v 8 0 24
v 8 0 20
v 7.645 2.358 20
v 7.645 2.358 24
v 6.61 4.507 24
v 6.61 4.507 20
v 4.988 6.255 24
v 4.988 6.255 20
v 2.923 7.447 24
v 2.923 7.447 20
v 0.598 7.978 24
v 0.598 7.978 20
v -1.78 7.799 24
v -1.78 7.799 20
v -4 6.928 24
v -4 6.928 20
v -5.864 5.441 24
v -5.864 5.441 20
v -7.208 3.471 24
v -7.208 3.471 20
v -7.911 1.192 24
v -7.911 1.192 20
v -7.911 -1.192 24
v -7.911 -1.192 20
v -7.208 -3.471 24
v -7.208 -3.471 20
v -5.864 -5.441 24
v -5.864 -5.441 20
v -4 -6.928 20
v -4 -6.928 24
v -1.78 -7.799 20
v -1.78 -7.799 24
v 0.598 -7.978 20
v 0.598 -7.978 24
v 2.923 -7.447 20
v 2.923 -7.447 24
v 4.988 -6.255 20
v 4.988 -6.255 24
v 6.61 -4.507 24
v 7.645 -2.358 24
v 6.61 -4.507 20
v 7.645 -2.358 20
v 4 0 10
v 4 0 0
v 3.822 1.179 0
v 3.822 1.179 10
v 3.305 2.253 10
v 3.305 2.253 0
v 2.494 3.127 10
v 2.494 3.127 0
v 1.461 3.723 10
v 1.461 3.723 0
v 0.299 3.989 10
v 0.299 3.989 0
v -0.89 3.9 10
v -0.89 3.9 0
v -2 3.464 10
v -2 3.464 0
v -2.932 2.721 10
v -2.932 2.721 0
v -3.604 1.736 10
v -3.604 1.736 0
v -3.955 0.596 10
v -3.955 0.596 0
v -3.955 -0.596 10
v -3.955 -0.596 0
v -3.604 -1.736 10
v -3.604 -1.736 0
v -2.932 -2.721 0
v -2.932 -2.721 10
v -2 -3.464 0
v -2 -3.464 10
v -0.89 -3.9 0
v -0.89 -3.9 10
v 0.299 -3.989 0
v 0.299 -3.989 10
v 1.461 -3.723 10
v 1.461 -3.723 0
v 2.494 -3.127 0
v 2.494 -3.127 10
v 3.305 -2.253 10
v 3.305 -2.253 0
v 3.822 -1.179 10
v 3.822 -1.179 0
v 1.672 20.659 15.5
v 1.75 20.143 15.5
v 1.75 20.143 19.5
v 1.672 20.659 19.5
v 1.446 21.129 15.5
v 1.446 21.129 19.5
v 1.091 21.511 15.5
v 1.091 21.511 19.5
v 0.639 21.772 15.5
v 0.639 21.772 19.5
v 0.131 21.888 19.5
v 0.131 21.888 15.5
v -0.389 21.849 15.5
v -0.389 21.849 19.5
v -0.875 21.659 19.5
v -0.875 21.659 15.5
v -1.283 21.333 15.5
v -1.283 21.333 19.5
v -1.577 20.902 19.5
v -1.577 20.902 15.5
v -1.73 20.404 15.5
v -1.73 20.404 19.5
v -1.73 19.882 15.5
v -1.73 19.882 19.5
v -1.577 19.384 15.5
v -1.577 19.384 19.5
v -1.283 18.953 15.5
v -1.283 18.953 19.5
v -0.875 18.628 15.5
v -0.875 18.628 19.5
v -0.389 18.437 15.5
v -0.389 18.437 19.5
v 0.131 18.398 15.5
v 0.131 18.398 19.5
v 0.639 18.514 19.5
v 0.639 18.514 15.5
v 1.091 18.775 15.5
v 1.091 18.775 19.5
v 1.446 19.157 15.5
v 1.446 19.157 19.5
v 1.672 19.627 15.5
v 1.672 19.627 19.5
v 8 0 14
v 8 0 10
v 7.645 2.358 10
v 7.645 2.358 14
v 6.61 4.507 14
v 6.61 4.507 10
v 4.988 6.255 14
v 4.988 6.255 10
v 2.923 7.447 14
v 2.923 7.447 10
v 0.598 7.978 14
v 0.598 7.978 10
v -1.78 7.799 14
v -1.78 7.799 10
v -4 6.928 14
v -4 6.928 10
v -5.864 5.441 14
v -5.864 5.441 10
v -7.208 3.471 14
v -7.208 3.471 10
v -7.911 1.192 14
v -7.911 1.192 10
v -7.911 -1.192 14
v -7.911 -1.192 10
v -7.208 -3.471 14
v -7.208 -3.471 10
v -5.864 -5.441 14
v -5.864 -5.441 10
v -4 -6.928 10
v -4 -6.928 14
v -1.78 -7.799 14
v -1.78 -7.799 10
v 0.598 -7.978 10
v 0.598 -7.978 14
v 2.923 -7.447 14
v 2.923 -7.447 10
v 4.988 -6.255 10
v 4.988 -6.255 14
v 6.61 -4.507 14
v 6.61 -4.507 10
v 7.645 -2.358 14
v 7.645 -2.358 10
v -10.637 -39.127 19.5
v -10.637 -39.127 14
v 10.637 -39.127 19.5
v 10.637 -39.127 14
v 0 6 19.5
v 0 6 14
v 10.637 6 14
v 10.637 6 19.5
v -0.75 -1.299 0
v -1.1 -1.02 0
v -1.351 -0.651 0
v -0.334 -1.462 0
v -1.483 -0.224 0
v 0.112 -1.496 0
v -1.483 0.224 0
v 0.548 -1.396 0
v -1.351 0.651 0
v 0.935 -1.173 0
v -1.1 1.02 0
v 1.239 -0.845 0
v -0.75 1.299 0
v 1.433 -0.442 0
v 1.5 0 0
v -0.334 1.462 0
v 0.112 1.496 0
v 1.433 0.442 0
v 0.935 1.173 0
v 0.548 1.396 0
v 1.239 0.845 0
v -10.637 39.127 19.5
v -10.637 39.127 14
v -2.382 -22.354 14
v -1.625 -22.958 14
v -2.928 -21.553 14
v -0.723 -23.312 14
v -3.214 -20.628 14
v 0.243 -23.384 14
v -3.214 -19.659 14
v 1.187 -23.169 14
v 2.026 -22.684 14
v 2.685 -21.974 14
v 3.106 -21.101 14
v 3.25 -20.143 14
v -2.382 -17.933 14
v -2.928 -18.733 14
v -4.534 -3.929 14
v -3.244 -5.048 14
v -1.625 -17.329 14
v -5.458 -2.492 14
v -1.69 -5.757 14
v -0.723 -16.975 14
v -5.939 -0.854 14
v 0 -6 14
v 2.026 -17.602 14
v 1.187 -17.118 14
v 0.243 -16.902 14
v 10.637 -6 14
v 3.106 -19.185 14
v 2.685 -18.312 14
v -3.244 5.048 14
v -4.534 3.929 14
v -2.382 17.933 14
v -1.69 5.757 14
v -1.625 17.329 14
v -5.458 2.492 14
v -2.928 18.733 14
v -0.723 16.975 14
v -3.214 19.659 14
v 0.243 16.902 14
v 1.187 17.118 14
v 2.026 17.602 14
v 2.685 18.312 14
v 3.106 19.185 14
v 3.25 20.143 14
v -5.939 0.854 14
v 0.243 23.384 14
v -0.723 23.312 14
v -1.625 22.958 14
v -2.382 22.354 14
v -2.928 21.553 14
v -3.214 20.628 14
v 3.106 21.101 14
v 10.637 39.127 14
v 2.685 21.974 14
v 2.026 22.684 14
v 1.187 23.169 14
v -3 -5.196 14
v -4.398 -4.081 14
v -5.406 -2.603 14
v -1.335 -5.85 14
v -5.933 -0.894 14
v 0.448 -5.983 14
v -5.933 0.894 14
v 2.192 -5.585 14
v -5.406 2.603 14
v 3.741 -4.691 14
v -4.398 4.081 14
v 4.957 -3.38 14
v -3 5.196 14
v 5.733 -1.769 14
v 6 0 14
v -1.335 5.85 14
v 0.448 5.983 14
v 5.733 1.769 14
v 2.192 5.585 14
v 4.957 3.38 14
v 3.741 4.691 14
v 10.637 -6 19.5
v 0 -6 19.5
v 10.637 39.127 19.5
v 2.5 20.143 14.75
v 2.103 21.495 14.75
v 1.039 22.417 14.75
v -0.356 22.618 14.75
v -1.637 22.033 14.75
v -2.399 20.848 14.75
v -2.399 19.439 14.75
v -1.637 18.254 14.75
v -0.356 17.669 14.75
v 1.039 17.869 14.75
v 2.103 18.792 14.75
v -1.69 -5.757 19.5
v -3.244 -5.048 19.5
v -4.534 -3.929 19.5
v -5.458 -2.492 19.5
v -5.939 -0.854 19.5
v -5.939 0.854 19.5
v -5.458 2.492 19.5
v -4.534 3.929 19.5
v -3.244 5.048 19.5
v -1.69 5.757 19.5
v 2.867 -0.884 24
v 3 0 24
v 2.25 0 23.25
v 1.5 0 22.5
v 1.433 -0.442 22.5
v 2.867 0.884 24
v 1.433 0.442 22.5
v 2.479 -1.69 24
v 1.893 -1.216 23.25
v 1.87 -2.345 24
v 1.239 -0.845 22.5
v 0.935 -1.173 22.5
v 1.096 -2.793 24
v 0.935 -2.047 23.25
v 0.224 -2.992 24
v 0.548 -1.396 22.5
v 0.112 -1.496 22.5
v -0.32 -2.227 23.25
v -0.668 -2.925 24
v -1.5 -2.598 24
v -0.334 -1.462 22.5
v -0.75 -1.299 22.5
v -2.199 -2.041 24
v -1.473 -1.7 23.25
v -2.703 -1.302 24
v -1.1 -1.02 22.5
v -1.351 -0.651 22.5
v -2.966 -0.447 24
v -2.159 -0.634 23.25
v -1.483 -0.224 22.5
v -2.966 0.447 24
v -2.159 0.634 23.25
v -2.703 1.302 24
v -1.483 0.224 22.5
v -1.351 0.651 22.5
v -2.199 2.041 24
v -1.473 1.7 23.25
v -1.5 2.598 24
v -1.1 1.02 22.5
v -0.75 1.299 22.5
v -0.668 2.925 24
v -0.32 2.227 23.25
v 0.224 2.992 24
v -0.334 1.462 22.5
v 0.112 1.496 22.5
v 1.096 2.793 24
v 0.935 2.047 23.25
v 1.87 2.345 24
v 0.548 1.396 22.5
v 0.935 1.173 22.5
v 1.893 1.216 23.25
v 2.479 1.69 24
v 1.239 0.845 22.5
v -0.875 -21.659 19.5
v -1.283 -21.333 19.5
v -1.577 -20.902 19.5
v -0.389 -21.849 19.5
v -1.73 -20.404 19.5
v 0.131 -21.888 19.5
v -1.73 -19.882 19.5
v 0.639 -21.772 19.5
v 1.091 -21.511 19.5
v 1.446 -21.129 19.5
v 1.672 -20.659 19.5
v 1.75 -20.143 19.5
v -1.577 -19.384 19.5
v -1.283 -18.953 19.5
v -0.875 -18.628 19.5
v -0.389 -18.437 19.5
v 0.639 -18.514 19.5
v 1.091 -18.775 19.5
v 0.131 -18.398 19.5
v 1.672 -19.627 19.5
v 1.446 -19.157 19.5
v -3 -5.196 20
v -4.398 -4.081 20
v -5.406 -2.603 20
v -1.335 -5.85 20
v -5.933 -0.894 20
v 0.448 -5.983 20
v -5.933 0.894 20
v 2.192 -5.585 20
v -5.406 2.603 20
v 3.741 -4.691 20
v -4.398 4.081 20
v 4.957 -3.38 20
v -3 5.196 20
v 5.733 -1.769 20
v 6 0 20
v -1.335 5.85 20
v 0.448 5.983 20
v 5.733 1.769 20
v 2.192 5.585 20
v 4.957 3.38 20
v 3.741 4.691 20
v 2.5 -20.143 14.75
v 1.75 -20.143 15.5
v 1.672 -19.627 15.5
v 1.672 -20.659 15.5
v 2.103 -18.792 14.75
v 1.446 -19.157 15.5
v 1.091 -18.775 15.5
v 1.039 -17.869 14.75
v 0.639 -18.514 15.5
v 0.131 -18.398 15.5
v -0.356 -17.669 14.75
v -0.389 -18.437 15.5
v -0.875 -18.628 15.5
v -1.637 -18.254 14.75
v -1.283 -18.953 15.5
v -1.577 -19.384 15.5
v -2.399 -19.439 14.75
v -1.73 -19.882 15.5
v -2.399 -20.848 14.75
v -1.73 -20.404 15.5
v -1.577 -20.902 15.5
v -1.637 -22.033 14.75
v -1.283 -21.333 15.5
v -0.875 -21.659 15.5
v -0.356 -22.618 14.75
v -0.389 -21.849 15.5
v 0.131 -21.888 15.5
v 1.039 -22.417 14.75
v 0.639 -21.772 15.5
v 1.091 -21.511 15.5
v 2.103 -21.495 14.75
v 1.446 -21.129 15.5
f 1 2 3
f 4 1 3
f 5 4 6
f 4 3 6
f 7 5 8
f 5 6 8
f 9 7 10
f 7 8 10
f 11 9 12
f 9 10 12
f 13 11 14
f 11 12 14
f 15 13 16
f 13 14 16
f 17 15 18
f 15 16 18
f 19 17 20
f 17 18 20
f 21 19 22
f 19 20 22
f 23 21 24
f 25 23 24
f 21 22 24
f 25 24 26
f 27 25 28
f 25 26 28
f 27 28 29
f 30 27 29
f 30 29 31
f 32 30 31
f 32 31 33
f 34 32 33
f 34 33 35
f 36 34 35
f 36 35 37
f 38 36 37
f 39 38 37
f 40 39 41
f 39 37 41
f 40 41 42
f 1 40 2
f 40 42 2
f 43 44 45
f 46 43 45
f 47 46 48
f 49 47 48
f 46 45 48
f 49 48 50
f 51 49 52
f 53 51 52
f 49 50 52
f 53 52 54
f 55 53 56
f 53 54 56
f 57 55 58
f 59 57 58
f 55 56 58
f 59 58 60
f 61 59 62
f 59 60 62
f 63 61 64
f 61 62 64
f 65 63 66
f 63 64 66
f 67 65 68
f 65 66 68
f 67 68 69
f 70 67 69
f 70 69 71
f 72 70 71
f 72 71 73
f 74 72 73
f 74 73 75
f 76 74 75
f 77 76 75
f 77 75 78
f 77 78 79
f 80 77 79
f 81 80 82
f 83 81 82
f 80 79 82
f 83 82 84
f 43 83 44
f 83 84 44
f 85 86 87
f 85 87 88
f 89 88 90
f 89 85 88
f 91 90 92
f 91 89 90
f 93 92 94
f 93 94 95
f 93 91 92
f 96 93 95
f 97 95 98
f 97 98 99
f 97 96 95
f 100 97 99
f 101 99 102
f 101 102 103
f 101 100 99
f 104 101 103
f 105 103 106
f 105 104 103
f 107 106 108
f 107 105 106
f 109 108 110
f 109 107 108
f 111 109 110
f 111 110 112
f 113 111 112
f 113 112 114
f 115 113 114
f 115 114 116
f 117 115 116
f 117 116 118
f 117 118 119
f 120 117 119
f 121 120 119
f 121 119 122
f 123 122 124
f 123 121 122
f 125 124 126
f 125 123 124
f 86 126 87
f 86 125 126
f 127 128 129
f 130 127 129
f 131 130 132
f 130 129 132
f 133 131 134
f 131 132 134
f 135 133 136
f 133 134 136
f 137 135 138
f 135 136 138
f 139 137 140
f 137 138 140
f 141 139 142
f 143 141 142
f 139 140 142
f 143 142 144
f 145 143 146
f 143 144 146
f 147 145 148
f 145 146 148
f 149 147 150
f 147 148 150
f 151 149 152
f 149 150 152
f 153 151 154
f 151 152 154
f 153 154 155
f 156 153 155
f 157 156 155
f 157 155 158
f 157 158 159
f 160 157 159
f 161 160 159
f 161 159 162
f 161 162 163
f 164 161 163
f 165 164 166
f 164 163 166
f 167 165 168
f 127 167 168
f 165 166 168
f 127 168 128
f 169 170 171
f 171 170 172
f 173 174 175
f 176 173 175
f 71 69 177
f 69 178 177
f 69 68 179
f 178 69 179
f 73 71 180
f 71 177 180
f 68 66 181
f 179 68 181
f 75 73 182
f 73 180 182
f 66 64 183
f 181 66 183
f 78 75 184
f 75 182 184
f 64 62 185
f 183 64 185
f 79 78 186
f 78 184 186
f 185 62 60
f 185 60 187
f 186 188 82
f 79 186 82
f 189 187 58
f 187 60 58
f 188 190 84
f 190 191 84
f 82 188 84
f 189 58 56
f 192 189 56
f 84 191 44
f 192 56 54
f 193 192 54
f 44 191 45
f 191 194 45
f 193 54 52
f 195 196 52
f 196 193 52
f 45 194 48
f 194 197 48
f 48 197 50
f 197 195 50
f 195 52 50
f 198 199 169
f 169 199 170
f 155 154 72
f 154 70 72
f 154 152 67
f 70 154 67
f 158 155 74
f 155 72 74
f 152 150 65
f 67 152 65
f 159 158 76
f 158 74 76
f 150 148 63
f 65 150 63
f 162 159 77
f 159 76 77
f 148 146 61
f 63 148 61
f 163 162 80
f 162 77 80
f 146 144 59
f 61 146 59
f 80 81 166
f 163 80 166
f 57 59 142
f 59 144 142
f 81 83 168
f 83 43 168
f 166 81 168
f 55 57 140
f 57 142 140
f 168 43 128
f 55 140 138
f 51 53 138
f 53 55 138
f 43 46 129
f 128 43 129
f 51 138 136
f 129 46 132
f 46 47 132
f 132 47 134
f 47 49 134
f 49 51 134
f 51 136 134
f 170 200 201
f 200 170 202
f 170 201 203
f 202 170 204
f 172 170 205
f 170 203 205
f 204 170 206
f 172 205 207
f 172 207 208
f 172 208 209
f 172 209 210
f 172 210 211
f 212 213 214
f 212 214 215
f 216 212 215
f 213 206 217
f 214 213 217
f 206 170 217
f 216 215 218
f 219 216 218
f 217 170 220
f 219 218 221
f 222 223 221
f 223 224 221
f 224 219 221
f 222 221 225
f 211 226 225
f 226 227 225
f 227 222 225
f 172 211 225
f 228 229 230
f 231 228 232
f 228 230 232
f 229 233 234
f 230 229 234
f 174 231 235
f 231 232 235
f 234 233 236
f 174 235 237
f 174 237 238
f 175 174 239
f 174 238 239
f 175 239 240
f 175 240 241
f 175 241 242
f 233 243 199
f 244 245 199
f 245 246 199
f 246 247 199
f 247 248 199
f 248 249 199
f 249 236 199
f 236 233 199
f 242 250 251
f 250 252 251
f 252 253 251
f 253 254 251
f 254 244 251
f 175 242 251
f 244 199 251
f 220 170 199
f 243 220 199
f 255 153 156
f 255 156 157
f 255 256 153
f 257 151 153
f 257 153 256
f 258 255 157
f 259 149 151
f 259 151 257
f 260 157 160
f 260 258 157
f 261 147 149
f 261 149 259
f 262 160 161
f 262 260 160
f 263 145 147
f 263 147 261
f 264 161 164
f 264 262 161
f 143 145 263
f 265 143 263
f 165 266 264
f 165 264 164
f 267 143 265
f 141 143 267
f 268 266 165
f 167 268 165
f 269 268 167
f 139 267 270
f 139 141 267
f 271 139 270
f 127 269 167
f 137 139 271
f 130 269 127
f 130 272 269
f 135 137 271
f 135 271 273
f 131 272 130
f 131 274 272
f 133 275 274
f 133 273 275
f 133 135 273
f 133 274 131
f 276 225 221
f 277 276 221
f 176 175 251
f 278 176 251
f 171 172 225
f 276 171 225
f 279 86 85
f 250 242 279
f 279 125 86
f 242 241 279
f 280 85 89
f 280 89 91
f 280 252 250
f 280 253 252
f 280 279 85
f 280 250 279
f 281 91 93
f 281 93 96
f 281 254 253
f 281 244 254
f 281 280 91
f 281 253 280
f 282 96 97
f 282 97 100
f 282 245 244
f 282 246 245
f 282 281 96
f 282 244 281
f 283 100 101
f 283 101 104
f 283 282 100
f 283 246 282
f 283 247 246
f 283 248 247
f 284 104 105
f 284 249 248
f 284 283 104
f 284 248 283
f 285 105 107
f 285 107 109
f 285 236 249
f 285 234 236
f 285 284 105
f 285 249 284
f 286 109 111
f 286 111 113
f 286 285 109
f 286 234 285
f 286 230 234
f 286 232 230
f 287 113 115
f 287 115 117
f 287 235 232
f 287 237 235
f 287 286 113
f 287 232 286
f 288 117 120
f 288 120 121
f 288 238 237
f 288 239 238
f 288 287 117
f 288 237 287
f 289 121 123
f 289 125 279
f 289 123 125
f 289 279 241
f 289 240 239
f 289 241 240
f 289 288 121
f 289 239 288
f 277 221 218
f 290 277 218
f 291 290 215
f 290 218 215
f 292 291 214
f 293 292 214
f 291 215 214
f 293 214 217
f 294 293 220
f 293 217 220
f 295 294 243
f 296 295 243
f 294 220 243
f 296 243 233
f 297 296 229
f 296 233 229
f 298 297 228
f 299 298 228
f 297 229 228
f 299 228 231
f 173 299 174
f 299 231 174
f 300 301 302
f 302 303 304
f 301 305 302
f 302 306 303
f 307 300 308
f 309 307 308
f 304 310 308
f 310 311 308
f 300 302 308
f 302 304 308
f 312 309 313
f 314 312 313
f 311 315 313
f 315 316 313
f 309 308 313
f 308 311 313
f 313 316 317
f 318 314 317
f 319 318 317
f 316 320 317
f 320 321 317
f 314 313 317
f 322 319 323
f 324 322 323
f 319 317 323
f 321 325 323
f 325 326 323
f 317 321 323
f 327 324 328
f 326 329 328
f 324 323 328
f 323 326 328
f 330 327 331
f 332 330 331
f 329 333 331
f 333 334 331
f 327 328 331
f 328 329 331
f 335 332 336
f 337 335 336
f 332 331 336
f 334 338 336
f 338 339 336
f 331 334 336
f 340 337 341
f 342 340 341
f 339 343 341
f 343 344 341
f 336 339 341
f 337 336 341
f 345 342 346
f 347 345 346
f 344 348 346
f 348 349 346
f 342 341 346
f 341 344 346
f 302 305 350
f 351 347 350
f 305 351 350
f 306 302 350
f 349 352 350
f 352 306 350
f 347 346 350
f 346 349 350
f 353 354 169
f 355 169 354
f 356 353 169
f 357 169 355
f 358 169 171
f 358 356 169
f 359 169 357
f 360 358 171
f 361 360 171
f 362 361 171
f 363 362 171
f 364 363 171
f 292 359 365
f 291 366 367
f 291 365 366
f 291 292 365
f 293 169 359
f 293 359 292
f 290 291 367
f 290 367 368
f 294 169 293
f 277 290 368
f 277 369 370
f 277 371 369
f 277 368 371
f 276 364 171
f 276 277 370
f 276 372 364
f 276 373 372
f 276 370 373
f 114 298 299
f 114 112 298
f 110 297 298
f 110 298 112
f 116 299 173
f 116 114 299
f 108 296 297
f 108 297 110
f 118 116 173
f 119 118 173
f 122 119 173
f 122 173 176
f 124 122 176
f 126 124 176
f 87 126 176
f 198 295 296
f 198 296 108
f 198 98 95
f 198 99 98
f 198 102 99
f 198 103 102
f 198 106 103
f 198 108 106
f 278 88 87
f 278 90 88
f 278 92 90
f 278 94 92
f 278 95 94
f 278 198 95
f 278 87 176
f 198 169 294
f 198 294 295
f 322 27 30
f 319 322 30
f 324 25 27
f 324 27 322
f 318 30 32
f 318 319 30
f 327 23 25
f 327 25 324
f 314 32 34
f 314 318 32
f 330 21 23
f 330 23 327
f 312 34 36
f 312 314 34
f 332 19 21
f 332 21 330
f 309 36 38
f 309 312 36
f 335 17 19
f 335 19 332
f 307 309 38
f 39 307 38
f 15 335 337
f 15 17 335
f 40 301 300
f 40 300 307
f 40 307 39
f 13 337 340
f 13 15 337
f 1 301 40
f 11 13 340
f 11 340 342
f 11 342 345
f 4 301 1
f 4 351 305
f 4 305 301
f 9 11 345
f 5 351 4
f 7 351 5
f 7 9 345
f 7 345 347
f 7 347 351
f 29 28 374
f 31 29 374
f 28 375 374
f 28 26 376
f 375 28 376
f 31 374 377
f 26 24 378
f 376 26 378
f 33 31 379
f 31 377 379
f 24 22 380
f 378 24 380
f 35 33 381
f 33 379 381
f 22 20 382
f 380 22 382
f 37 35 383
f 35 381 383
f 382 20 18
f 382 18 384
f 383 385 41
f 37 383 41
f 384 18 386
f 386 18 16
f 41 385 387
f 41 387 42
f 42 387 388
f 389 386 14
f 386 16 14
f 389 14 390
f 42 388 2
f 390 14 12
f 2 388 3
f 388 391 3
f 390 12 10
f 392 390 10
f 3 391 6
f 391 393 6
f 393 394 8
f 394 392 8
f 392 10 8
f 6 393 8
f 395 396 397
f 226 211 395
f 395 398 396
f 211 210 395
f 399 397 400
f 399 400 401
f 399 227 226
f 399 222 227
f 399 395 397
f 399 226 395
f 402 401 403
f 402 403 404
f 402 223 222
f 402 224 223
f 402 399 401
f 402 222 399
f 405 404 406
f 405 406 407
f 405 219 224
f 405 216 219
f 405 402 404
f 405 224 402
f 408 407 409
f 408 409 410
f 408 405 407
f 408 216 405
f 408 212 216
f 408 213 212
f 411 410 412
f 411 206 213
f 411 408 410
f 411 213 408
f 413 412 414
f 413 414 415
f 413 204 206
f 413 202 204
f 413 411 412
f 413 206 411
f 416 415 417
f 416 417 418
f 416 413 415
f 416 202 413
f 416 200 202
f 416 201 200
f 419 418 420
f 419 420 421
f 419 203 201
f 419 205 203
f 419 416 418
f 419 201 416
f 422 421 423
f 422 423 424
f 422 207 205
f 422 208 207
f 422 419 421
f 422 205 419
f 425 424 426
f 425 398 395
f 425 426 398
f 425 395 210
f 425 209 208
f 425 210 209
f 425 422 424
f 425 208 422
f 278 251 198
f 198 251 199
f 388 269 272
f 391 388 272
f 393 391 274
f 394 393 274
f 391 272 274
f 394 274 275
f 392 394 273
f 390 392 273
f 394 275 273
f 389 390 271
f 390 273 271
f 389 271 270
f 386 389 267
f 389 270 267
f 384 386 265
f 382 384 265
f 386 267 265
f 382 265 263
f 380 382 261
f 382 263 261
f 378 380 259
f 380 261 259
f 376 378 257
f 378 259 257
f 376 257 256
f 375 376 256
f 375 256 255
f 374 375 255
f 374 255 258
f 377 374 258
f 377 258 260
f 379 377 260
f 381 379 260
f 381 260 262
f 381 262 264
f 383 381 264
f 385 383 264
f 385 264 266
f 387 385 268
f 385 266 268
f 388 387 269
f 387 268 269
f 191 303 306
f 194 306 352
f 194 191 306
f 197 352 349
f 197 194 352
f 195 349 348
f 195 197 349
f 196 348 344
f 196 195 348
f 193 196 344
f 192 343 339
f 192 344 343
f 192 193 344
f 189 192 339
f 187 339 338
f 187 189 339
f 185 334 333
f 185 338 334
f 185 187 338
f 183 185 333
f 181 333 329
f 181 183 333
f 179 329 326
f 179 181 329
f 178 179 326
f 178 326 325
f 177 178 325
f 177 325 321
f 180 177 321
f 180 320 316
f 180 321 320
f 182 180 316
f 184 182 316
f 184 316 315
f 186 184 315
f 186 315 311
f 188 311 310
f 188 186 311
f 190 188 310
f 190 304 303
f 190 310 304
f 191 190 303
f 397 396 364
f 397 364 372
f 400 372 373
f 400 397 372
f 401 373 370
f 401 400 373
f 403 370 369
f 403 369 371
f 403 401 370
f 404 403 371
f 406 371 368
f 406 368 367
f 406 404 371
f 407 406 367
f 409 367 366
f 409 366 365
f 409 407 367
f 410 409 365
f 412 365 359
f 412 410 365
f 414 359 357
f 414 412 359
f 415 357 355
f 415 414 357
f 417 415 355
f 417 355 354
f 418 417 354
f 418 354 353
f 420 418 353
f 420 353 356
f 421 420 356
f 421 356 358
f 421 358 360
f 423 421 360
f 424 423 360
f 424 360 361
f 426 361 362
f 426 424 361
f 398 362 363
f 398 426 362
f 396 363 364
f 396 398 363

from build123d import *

# Parameters (mm, degrees)
F0_R      = 4
F0_R_2    = 1.5
F1_DEPTH  = 10
F2_R      = 8
F3_DEPTH  = 4
F4_R      = 6
F5_DEPTH  = 6
F6_R      = 8
F7_DEPTH  = 4
F8_DEPTH  = 24.001
F9_SIZE   = 1.5
F10_R     = 1.75
F11_DEPTH = 5.5
F12_SIZE  = 1.5


with BuildPart() as f1:
    # F0 (on Top) → F1 (new body)
    with BuildSketch(Plane.XY):
        Circle(F0_R)
        Circle(F0_R_2, mode=Mode.SUBTRACT)
        Circle(F0_R_2)
    extrude(amount=F1_DEPTH)

    # F2 (on face) → F3 (join)
    with BuildSketch(Plane.XY.offset(10)):
        Circle(F2_R)
    extrude(amount=F3_DEPTH)

    # F4 (on face) → F5 (join)
    with BuildSketch(Plane.XY.offset(14)):
        Circle(F4_R)
    extrude(amount=F5_DEPTH)

    # F6 (on face) → F7 (join)
    with BuildSketch(Plane.XY.offset(20)):
        Circle(F6_R)
    extrude(amount=F7_DEPTH)

    # F0 (on Top) → F8 (cut, through all)
    with BuildSketch(Plane.XY):
        Circle(F0_R_2)
    extrude(amount=F8_DEPTH, mode=Mode.SUBTRACT)

    # F9
    f9_edges = [f1.edges().sort_by_distance(p)[0] for p in [
        (-1.5, 0, 24),
    ]]
    chamfer(f9_edges, length=F9_SIZE)


with BuildPart() as f11:
    # F10 (on face) → F11 (new body)
    with BuildSketch(Plane.XY.offset(14)):
        with BuildLine():
            Line((-10.6372348964, 39.1267947853), (-10.6372348964, -39.1267947853))
            Line((-10.6372348964, -39.1267947853), (10.6372348964, -39.1267947853))
            Line((10.6372348964, -39.1267947853), (10.6372348964, -6))
            Line((10.6372348964, -6), (5.2915026221, -6))
            ThreePointArc((5.2915026221, -6), (-8, 0), (5.2915026221, 6))
            Line((5.2915026221, 6), (10.6372348964, 6))
            Line((10.6372348964, 6), (10.6372348964, 39.1267947853))
            Line((10.6372348964, 39.1267947853), (-10.6372348964, 39.1267947853))
        make_face()
        with Locations((0, -20.1431717724)):
            Circle(F10_R, mode=Mode.SUBTRACT)
        with Locations((0, 20.1431717724)):
            Circle(F10_R, mode=Mode.SUBTRACT)
        with BuildLine():
            ThreePointArc((5.2915026221, 6), (-8, 0), (5.2915026221, -6))
            Line((5.2915026221, -6), (0, -6))
            ThreePointArc((0, -6), (-6, 0), (0, 6))
            Line((0, 6), (5.2915026221, 6))
        make_face()
    extrude(amount=F11_DEPTH)

    # F12
    f12_edges = [f11.edges().sort_by_distance(p)[0] for p in [
        (-1.75, 20.143172, 14),
        (-1.75, -20.143172, 14),
    ]]
    chamfer(f12_edges, length=F12_SIZE)


solid = Compound([f1.part, f11.part])
